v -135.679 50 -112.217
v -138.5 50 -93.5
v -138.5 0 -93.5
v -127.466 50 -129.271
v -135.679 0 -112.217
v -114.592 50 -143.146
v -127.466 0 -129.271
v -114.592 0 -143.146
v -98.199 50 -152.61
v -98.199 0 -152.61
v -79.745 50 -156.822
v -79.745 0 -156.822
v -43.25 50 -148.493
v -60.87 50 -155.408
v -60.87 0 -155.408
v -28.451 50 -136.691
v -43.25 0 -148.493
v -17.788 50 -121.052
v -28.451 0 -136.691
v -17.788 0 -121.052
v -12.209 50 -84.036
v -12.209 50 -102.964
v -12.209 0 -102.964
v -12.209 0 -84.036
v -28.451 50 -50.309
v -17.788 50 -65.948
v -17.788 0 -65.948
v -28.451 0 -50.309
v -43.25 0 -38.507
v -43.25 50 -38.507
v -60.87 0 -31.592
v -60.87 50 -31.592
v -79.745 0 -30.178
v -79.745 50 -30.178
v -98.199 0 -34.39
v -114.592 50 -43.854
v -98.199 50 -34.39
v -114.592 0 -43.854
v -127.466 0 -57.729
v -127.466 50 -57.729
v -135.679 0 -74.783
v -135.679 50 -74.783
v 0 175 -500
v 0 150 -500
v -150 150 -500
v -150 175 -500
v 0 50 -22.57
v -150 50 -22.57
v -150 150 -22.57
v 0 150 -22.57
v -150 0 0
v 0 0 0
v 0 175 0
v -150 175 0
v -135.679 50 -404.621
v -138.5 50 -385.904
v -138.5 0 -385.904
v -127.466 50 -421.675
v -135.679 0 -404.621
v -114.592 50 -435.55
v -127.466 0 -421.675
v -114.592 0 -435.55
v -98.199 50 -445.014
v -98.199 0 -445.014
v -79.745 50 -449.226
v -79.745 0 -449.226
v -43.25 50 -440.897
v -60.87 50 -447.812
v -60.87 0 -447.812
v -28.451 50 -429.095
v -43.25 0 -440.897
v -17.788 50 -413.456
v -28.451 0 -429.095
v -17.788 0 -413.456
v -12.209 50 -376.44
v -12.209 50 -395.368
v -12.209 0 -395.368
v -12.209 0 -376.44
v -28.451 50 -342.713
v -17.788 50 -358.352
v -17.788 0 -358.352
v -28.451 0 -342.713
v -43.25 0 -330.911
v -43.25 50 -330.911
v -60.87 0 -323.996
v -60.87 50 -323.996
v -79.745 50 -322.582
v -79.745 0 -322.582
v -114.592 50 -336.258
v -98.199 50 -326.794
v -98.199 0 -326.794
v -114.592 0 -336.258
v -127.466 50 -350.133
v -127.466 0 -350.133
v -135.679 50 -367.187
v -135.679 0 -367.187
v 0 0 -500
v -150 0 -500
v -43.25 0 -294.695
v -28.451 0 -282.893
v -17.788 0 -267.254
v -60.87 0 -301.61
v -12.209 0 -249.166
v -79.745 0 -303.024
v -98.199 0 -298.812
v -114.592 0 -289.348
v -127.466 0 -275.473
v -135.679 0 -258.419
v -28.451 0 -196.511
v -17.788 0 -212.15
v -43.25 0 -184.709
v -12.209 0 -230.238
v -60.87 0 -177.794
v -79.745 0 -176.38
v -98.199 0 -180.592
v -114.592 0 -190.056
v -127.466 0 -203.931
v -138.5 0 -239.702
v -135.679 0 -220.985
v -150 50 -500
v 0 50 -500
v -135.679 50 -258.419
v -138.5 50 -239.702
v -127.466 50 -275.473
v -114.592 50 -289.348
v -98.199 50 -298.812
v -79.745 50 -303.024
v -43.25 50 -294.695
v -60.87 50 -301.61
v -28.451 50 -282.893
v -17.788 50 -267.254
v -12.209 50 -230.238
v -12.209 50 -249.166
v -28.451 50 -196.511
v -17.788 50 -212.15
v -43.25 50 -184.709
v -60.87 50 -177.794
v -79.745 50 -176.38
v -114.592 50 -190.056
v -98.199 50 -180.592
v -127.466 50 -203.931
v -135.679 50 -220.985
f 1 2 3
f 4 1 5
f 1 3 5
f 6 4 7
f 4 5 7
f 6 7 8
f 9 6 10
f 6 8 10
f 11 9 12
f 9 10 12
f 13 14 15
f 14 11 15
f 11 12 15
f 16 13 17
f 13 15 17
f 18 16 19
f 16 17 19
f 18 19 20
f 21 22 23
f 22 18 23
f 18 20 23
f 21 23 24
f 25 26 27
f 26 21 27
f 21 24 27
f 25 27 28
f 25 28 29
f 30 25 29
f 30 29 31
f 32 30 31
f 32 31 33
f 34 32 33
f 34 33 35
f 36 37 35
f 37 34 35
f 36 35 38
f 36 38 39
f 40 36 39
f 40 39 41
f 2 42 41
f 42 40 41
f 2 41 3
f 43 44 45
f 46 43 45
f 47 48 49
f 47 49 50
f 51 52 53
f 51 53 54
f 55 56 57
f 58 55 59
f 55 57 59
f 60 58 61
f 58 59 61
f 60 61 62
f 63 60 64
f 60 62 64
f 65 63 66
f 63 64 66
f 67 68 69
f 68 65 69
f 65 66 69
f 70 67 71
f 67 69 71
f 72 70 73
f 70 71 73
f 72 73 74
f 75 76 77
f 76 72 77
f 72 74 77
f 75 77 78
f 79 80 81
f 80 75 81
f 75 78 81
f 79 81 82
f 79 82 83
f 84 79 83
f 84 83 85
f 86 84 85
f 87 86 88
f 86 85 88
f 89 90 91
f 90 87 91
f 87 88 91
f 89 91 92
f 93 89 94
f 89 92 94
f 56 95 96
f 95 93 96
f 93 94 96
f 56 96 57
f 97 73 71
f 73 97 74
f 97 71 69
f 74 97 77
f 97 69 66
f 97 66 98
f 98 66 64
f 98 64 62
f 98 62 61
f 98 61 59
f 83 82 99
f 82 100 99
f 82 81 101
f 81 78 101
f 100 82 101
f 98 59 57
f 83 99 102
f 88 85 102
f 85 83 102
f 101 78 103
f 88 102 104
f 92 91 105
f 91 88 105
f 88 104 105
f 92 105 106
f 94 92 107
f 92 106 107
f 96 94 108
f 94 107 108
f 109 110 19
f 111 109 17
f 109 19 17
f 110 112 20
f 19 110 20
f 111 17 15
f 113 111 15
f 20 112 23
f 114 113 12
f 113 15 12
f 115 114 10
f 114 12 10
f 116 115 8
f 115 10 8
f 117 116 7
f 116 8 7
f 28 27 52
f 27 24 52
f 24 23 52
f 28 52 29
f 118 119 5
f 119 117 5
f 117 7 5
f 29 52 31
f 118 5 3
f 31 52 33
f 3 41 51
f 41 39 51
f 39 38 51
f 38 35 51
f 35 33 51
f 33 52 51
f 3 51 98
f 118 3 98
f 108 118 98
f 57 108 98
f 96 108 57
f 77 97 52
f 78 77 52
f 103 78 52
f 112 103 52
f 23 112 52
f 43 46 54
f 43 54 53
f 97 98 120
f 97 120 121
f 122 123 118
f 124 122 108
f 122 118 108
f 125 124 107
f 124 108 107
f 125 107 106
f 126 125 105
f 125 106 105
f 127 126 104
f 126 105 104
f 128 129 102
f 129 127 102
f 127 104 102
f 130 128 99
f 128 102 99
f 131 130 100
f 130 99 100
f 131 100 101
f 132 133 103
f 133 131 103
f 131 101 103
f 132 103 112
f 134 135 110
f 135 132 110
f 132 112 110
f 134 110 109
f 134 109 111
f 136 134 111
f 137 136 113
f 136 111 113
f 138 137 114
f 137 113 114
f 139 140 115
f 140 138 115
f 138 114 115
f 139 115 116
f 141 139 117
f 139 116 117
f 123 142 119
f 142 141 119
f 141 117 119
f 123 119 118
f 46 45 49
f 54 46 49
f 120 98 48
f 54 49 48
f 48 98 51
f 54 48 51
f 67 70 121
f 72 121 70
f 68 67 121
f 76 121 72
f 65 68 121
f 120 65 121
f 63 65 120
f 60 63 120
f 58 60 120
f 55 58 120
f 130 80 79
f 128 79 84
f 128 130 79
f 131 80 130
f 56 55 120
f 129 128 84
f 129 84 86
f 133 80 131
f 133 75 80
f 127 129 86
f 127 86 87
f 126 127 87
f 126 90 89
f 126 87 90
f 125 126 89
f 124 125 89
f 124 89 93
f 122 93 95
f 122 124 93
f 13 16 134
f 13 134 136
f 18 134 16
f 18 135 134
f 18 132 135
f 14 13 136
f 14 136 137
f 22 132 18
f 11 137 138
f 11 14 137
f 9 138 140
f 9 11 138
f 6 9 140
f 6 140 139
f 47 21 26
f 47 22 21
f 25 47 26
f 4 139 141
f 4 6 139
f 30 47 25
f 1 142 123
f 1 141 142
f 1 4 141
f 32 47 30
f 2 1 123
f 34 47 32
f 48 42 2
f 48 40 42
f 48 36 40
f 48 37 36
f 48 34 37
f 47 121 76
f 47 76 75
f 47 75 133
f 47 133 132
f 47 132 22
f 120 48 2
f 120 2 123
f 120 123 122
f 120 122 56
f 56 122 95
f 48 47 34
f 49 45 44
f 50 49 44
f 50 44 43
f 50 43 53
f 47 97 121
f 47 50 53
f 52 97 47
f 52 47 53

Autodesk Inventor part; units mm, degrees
ref_plane "YZ Plane" through (0, 0, 0) normal (1, 0, 0) x (0, 1, 0)
ref_plane "XZ Plane" through (0, 0, 0) normal (0, 1, 0) x (-1, 0, 0)
ref_plane "XY Plane" through (0, 0, 0) normal (0, 0, 1) x (1, 0, 0)
sketch "Sketch2" plane through (0, 0, 0) normal (0, 1, 0) x (-1, 0, 0)
  line L0 (0, 0) -> (150, 0)
  line L1 (150, 0) -> (150, -500)
  line L2 (150, -500) -> (0, -500)
  line L3 (0, -500) -> (0, 0)
  line L4 (75, 0) -> (75, -93.5) construction
  circle A0 centre (75, -93.5) radius 63.5
  circle A1 centre (75, -239.702) radius 63.5
  circle A2 centre (75, -385.904) radius 63.5
  dimension "d9" = 150
  dimension "d10" = 500
  dimension "d11" = 93.5
  dimension "d12" = 127
  dimension "d13" = 127
  dimension "d14" = 127
  dimension "d15" = 146.202
  dimension "d16" = 146.202
extrude "Extrusion1" add sketch "Sketch2" along normal blind 50
sketch "Sketch3" plane through (0, 50, 0) normal (0, 1, 0) x (1, 0, 0)
  line L0 (-150, 500) -> (-150, 0) projected
  line L1 (-150, 0) -> (0, 0) projected
  line L2 (-150, 0) -> (0, 0)
  line L3 (0, 0) -> (0, 22.5702)
  line L4 (0, 0) -> (0, 500) projected
  line L5 (-150, 22.5702) -> (-150, 0)
  line L6 (-150, 22.5702) -> (0, 22.5702)
extrude "Extrusion2" add sketch "Sketch3" along normal blind 100
sketch "Sketch4" plane through (0, 150, 0) normal (0, 1, 0) x (1, 0, 0)
  line L0 (0, 0) -> (-150, 0) projected
  line L1 (0, 500) -> (0, 0) projected
  line L2 (-150, 0) -> (0, 0)
  line L3 (0, 0) -> (0, 500)
  line L4 (0, 500) -> (-150, 500)
  line L5 (-150, 500) -> (-150, 0)
extrude "Extrusion3" add sketch "Sketch4" along normal blind 25
properties part number "piston align"
